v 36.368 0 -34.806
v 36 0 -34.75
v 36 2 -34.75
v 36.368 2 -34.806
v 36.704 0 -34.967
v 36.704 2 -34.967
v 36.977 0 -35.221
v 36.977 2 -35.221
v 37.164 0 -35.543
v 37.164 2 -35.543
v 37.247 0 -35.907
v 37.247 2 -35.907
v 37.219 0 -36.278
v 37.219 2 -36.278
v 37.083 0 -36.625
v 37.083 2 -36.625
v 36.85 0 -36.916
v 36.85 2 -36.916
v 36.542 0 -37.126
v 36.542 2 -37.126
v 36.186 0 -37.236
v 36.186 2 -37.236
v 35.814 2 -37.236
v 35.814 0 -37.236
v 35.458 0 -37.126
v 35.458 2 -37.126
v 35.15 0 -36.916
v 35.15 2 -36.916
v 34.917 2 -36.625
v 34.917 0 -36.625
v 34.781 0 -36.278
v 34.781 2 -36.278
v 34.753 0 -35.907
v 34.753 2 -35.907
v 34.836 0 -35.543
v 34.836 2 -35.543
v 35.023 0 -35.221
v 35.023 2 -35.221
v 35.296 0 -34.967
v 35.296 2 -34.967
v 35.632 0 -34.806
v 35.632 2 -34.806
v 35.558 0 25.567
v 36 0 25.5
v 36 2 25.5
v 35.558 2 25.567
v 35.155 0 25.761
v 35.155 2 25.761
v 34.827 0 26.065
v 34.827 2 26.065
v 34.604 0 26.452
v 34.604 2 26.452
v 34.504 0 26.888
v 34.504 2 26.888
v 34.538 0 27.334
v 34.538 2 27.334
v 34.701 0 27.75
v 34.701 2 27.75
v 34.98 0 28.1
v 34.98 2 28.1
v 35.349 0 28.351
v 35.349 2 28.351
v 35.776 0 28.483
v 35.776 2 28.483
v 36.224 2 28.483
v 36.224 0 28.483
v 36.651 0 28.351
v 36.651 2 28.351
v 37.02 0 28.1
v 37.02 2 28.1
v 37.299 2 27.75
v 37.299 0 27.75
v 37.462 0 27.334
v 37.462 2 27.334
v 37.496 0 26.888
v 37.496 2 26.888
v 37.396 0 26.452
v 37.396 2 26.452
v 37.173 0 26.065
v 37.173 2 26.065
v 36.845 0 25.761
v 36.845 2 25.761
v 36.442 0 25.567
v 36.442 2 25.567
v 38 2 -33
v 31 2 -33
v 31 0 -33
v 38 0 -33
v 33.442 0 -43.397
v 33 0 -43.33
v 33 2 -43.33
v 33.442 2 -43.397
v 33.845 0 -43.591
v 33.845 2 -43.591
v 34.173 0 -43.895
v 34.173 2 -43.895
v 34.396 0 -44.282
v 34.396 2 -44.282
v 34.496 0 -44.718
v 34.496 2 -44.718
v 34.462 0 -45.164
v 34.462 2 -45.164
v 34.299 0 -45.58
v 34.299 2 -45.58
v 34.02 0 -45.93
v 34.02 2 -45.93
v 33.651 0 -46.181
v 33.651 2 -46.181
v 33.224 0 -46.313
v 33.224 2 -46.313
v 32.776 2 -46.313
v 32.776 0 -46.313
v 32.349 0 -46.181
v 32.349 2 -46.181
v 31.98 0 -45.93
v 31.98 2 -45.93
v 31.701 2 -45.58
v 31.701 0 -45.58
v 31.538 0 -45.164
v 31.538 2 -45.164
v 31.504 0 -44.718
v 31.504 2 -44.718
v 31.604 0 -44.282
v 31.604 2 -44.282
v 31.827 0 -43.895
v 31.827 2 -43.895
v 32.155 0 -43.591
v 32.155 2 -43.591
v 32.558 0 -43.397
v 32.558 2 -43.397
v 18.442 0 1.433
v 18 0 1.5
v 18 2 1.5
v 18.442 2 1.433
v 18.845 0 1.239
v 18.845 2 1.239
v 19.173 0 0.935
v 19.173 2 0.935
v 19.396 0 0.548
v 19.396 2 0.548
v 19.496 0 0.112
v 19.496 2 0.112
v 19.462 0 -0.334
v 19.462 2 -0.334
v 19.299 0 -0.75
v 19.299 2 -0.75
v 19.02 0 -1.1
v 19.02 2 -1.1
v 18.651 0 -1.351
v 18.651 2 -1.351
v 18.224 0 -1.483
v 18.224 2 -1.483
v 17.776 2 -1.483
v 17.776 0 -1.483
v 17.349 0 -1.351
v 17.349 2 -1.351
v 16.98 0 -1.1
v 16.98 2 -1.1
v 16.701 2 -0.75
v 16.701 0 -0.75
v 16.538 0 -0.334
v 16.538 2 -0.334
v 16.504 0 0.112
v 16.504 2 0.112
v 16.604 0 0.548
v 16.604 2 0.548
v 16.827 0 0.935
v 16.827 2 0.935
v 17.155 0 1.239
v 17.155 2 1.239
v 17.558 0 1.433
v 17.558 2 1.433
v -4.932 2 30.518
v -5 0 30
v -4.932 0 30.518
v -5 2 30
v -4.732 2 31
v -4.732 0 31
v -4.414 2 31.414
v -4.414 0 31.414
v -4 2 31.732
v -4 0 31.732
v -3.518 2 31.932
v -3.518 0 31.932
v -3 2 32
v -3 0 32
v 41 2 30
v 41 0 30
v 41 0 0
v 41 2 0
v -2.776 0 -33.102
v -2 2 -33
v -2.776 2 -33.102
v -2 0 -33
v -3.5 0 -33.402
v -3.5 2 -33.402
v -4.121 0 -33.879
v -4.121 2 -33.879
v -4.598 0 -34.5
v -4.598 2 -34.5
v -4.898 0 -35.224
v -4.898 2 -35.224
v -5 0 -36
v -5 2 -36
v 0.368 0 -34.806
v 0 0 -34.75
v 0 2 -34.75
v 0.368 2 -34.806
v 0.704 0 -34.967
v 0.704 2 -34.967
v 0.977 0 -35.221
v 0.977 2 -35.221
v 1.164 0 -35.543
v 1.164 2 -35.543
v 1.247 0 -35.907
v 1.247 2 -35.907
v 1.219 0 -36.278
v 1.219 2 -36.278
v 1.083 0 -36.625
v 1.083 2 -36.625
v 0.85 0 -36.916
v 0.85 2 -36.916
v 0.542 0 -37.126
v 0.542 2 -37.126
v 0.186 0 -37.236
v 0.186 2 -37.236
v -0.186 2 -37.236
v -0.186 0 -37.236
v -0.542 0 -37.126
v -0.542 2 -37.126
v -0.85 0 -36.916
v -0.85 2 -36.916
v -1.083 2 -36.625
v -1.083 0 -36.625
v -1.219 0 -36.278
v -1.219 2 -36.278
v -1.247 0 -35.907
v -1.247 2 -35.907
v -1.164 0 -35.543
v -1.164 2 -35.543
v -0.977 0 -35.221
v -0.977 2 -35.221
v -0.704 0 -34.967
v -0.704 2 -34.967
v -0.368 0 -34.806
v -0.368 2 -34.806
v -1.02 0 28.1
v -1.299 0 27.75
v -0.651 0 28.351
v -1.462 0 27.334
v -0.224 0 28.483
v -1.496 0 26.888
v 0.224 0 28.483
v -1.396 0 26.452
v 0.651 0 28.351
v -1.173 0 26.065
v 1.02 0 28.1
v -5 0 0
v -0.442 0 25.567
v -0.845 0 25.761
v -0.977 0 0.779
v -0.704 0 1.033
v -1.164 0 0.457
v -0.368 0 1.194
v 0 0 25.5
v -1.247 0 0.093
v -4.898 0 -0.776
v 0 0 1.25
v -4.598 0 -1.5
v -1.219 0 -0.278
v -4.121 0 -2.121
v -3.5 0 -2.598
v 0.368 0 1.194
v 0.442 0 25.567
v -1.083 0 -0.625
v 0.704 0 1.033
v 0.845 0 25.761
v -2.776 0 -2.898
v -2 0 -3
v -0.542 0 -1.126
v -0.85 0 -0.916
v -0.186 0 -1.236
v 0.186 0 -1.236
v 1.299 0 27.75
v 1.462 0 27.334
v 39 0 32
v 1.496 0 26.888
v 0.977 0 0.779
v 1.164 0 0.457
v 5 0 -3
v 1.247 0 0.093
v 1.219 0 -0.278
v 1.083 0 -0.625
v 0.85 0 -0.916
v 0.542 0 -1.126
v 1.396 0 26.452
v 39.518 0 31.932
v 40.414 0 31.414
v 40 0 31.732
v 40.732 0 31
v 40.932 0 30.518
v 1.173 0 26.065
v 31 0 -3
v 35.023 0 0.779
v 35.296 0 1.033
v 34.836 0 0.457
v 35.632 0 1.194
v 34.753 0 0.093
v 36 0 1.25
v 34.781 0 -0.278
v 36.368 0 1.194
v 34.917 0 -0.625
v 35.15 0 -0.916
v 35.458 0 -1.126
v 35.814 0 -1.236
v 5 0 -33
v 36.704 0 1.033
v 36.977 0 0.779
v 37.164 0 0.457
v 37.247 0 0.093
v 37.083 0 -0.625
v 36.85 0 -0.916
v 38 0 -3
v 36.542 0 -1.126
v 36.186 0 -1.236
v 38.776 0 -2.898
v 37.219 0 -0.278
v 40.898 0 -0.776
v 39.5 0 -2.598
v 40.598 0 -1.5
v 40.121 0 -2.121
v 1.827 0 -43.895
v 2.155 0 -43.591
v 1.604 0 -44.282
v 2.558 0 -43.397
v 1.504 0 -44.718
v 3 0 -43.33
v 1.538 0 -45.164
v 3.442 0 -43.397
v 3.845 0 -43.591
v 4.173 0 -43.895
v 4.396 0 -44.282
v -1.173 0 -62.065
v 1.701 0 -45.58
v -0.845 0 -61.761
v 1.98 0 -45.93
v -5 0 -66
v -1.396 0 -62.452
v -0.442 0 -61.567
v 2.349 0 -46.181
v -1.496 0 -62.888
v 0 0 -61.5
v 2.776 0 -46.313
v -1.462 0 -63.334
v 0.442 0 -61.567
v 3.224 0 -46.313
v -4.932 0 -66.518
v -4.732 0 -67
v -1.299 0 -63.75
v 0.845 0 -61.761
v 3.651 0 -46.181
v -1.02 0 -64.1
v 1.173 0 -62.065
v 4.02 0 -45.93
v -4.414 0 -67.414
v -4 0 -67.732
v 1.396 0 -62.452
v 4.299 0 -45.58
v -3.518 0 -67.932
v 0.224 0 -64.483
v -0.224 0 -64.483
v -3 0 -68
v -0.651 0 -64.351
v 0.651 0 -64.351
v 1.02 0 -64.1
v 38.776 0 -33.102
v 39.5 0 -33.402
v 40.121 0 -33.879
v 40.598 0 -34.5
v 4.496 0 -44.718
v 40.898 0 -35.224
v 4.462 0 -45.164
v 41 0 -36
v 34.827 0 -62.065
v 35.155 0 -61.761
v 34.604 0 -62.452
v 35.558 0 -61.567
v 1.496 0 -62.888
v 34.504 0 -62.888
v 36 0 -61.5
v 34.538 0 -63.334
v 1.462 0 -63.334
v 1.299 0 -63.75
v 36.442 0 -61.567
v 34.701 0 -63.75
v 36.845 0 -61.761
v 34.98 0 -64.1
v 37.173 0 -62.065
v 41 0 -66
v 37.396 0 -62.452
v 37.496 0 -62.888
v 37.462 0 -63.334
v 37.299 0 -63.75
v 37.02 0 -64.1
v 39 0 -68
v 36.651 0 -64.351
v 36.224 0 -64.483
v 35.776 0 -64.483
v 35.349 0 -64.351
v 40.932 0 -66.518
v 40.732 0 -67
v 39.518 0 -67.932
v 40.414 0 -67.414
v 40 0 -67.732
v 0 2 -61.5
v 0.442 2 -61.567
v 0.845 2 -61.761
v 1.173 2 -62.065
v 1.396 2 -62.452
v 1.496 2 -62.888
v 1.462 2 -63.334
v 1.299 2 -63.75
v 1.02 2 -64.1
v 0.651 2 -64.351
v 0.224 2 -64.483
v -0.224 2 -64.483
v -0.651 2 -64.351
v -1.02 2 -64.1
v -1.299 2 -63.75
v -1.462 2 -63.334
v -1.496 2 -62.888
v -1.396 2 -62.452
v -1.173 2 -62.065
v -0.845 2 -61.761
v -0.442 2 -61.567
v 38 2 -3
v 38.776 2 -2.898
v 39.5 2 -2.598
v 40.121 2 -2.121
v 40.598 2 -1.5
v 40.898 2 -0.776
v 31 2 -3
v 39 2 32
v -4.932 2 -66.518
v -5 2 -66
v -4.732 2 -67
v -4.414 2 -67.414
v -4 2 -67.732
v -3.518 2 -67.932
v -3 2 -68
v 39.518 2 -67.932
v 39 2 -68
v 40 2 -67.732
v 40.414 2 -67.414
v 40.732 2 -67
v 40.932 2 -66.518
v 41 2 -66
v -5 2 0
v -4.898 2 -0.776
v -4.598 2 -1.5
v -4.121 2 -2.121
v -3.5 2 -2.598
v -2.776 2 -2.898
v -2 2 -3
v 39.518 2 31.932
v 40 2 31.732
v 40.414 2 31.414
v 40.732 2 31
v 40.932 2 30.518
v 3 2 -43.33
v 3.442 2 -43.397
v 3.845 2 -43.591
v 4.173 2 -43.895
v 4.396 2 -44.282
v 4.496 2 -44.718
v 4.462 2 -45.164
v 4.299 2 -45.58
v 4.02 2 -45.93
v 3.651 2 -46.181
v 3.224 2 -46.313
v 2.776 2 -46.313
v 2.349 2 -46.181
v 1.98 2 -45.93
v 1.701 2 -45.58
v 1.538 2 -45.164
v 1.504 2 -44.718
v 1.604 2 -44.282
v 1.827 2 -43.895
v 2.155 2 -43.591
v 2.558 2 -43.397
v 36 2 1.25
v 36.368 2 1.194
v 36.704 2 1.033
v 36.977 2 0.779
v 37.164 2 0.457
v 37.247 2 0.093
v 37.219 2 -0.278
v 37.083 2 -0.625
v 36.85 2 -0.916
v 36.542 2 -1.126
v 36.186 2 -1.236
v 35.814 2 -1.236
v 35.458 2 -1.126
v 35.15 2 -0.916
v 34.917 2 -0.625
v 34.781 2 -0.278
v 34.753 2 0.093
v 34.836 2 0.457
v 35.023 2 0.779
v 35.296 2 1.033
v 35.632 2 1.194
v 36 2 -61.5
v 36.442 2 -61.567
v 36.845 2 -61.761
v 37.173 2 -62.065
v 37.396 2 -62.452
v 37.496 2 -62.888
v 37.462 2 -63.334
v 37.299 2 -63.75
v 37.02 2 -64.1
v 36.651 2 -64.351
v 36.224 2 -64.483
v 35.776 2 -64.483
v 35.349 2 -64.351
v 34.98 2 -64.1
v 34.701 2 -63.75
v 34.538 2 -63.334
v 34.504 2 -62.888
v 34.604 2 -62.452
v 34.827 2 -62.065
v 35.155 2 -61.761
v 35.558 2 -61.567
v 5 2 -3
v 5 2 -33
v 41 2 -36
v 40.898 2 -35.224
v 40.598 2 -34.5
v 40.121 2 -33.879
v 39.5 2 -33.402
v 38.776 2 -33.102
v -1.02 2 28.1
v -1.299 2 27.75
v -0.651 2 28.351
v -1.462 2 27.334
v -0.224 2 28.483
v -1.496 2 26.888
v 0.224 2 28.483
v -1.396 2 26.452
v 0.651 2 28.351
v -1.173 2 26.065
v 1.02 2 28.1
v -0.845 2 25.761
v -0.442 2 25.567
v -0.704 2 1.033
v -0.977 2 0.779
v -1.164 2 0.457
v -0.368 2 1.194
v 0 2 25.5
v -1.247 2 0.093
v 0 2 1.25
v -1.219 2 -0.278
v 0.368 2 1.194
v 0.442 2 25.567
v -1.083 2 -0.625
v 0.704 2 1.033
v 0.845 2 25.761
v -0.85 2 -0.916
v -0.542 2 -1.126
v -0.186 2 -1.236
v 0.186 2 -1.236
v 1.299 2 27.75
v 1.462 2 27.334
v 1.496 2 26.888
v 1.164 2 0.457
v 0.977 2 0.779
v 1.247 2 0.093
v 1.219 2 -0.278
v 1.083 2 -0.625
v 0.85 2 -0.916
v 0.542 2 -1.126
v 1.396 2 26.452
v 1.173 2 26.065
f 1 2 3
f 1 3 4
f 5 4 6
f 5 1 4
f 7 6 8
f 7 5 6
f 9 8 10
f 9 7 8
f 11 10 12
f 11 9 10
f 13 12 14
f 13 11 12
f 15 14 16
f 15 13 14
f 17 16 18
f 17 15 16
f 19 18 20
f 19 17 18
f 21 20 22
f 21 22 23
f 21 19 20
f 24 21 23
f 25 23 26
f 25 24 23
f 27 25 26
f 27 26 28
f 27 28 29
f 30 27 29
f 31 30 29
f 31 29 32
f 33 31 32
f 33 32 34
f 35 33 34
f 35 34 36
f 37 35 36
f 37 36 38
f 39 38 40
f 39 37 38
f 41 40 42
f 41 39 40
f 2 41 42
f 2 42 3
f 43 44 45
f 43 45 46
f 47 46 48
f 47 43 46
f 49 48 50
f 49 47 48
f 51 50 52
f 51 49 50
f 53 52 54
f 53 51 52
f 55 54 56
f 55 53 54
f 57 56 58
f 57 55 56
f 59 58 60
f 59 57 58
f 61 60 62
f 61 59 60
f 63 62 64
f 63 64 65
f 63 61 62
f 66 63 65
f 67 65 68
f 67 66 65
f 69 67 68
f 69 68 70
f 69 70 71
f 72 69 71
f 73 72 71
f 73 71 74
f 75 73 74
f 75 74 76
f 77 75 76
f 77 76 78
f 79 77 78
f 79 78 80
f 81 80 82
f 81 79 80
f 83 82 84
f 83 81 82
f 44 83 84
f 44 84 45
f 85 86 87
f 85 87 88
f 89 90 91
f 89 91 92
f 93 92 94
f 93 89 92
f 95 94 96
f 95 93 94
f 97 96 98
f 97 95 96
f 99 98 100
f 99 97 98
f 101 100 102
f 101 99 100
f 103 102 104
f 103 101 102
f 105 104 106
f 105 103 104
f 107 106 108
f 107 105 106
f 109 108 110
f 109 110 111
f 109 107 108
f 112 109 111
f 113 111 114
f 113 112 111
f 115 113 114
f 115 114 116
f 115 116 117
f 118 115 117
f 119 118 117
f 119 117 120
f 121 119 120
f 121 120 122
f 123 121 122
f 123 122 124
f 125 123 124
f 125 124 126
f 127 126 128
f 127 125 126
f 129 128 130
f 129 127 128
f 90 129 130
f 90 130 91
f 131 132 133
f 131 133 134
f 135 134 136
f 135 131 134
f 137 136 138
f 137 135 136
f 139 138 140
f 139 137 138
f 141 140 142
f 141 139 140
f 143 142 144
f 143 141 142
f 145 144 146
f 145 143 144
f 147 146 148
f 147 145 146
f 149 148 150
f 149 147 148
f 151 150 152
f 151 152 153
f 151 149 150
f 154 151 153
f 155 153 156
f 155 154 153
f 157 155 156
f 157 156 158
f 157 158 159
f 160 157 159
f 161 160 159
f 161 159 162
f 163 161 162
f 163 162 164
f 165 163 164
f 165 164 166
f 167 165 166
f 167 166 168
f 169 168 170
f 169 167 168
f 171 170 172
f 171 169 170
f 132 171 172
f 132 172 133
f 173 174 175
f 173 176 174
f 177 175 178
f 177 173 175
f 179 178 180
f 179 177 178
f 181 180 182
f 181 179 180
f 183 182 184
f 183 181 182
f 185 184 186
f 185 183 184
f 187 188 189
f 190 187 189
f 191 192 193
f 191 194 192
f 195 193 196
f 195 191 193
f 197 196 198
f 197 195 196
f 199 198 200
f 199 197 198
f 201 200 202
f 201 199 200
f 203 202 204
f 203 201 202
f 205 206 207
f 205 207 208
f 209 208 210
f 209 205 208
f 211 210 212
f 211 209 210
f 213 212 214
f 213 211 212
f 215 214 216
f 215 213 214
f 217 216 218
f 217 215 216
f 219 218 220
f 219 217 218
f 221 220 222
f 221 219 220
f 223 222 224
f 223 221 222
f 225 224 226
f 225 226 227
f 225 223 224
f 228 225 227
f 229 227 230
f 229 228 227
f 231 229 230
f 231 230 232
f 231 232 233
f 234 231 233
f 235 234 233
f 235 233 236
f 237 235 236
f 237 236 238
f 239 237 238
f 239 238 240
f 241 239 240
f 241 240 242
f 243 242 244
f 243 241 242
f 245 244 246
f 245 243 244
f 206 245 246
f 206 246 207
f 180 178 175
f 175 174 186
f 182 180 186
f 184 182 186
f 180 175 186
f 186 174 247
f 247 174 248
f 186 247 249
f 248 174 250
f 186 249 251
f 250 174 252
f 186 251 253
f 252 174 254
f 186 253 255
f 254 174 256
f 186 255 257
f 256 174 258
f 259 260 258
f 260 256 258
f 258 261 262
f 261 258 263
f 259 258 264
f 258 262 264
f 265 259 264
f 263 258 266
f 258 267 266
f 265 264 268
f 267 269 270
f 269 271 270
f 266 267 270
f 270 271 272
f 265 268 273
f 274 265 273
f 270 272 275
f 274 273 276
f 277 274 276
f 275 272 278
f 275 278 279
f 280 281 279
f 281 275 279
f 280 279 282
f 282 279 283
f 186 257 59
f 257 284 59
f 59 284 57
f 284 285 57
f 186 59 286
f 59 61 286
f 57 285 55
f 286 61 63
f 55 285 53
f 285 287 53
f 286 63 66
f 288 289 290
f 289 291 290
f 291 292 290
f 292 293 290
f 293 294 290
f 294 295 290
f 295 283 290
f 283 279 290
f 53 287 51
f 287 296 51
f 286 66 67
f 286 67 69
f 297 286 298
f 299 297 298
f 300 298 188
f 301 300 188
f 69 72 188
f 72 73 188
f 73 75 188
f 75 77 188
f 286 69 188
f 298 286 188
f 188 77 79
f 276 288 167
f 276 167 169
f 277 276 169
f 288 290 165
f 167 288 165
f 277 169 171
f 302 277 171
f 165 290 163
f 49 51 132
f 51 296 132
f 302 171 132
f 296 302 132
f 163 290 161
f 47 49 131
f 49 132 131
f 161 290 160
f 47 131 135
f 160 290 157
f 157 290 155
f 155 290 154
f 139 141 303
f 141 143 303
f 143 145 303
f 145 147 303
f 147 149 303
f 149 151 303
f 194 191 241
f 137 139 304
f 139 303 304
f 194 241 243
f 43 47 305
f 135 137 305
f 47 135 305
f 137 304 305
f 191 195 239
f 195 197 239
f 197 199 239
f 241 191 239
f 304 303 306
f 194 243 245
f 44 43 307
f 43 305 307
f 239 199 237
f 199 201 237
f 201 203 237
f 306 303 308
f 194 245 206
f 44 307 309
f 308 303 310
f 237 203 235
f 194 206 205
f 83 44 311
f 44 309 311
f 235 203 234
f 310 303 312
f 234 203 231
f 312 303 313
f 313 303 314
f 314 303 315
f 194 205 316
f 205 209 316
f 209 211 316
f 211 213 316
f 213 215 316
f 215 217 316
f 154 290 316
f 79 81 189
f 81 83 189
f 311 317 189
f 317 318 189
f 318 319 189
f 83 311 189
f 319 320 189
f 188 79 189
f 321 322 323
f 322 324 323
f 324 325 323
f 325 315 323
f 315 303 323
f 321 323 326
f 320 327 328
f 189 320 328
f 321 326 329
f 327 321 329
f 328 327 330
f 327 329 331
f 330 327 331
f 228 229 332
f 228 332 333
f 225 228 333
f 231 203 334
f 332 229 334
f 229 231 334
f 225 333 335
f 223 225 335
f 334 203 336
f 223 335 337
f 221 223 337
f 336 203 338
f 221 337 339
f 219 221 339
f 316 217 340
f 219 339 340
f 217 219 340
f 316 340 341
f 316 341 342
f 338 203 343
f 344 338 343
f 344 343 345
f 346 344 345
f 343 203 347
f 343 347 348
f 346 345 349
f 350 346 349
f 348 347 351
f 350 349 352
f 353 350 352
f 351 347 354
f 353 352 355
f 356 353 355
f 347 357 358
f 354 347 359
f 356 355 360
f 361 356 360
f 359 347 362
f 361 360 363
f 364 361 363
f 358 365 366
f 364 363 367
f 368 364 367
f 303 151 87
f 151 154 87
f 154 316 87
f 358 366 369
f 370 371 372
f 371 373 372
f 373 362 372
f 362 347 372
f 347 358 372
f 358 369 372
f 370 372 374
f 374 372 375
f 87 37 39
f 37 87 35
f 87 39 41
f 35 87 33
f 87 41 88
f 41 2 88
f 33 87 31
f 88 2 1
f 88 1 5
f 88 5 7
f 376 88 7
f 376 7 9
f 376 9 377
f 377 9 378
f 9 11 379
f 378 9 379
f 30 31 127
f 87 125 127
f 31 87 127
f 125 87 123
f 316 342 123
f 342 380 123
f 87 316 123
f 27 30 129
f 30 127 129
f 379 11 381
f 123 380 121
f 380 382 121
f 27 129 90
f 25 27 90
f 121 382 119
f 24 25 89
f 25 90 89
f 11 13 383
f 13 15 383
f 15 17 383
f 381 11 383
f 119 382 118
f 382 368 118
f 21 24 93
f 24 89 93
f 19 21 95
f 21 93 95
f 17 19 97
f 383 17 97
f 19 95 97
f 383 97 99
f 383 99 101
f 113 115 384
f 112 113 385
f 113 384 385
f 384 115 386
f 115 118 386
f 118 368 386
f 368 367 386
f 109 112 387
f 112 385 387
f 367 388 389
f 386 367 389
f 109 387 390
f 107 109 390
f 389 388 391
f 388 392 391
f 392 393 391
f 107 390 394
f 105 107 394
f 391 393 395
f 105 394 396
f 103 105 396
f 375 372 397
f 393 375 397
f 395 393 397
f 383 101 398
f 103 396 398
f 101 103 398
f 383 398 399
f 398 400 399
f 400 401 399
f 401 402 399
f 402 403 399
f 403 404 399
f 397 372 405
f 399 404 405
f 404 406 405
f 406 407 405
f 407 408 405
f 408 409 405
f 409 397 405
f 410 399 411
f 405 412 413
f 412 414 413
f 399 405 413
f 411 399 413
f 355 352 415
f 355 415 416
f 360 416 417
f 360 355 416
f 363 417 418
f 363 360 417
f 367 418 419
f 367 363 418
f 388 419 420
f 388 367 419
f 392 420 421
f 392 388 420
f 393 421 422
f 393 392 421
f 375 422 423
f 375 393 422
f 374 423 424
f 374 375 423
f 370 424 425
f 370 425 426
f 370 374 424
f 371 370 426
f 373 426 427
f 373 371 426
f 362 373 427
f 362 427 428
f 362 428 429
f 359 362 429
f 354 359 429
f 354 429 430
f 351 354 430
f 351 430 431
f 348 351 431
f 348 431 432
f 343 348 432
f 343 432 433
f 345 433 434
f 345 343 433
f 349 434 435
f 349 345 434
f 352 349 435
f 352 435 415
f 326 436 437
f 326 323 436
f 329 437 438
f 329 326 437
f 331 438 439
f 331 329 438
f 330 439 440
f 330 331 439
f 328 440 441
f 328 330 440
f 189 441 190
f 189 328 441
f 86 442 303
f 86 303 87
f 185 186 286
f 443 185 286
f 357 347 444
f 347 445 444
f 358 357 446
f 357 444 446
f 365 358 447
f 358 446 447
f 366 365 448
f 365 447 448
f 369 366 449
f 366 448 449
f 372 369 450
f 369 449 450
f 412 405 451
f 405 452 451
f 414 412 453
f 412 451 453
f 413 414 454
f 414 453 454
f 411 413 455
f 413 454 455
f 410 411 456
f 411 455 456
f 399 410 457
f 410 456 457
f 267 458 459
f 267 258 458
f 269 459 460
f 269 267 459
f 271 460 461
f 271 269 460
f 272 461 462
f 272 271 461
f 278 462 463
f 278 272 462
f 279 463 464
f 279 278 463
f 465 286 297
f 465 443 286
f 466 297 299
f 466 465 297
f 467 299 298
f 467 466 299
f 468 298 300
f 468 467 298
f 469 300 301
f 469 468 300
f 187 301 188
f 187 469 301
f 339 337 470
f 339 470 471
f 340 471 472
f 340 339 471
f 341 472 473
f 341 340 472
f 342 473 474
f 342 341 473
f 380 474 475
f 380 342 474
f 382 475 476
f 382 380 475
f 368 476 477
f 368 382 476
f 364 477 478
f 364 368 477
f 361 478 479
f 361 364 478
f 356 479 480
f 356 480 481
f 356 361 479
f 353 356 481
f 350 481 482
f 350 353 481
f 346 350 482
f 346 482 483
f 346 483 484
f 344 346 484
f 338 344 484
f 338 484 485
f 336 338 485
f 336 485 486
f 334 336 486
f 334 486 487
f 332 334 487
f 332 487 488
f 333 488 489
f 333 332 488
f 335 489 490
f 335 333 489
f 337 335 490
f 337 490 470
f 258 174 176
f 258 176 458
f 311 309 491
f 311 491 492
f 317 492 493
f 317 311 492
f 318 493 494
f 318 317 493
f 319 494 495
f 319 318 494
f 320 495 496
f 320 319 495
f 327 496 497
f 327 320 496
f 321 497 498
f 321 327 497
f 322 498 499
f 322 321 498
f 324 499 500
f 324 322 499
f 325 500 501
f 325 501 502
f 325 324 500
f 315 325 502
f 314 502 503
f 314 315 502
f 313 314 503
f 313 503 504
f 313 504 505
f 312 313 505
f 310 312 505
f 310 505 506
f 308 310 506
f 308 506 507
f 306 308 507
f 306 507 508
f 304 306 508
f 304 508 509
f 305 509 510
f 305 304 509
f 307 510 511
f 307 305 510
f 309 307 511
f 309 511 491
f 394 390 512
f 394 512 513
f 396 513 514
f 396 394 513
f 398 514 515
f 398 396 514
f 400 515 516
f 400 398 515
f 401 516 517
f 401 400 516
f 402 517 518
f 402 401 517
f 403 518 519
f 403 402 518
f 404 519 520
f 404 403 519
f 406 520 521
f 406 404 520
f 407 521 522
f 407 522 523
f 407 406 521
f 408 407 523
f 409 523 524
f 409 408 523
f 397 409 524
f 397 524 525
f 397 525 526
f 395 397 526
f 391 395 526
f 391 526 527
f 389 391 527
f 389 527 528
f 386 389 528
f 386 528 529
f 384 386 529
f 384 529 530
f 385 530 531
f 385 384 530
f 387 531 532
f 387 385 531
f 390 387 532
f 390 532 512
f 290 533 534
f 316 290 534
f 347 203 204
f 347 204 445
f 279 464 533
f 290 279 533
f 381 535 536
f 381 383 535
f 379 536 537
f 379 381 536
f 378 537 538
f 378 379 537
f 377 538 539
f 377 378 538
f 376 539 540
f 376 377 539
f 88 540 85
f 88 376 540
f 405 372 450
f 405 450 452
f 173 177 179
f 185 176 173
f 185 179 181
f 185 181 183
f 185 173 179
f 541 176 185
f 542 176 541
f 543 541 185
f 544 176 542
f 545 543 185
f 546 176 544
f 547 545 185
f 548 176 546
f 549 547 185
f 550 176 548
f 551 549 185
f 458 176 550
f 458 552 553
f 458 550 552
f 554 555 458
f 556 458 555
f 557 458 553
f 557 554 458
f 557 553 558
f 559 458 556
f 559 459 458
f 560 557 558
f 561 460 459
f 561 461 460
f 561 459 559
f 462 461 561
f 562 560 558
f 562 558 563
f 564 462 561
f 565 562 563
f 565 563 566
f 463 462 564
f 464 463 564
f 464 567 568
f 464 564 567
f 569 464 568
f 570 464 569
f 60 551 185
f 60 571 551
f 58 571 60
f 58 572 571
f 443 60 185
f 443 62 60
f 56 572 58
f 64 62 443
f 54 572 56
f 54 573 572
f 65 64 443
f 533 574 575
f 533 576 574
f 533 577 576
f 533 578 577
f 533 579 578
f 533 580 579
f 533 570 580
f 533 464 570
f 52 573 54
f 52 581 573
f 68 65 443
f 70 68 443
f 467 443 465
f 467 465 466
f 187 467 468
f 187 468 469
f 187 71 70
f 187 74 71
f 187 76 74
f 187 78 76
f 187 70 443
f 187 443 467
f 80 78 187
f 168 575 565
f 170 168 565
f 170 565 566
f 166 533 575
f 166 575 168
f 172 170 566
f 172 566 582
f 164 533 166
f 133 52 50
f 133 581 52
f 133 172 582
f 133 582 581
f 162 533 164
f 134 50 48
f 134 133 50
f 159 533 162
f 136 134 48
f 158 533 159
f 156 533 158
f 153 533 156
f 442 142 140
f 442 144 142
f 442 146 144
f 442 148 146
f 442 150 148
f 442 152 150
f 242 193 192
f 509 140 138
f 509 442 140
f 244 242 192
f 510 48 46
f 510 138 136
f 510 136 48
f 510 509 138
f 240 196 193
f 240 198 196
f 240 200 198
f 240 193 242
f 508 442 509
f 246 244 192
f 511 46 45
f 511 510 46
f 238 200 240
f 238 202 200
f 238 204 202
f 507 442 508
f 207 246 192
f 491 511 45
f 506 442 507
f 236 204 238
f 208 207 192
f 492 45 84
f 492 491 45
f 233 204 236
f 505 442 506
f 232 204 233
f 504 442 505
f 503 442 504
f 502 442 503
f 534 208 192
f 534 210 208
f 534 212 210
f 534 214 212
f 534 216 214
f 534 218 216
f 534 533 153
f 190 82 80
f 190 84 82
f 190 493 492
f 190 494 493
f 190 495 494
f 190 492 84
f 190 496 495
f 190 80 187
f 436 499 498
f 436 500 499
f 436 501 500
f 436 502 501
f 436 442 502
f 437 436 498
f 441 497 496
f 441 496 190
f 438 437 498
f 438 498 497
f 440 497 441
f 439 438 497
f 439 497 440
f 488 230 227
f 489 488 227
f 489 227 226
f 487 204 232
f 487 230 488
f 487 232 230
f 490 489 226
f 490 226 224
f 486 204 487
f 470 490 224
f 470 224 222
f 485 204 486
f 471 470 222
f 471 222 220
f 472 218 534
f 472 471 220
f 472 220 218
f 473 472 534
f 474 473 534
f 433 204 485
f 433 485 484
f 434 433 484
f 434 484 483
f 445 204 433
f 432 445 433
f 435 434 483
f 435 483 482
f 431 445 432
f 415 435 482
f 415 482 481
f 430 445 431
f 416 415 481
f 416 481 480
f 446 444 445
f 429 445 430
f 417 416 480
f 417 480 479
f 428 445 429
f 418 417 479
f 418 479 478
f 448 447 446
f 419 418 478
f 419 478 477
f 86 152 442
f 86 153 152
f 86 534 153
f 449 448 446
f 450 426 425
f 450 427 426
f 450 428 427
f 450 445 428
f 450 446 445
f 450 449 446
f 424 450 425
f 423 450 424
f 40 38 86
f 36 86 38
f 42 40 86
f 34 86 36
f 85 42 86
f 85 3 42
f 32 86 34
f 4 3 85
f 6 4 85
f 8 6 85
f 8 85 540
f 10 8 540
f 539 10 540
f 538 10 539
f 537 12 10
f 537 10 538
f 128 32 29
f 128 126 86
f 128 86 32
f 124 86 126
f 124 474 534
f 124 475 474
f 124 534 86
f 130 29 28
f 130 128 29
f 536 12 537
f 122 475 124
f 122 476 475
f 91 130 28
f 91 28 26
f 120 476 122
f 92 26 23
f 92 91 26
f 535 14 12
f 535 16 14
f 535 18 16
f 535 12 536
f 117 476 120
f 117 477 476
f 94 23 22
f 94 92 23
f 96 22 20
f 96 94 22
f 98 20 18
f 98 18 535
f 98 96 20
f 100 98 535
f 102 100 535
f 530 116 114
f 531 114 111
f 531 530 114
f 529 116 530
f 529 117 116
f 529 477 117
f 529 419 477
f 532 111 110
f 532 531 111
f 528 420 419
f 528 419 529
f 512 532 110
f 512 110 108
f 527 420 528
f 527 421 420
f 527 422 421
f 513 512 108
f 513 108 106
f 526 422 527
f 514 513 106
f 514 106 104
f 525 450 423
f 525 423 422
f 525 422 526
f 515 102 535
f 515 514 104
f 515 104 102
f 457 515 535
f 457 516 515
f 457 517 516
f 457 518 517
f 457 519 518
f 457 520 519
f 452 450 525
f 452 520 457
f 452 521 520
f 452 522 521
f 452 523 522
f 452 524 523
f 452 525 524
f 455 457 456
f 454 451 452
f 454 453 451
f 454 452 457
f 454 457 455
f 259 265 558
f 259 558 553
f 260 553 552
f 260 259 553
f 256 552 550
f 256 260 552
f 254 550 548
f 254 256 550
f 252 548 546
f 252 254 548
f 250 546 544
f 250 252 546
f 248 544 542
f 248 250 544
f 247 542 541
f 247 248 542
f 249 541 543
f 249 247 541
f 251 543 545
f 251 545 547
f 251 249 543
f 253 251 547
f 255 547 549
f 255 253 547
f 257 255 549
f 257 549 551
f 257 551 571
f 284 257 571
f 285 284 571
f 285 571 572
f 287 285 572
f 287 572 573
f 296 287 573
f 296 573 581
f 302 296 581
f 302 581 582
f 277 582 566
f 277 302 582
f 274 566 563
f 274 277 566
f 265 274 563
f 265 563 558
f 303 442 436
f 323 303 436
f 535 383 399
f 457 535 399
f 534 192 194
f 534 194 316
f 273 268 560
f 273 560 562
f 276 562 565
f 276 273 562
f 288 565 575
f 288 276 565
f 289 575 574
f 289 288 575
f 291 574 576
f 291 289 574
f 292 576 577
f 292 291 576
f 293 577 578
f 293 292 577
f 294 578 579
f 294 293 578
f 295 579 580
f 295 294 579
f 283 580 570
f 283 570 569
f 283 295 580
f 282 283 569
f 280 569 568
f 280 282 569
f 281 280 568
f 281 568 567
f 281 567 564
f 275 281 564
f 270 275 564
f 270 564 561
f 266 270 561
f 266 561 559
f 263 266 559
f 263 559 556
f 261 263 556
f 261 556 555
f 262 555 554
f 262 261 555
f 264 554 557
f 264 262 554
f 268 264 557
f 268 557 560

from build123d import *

# Parameters (mm, degrees)
SKETCH_1_W          = 46
SKETCH_1_H          = 100
SKETCH_1_R          = 1.25
SKETCH_1_R_2        = 1.5
EXTRUDE_1_DEPTH     = 2
FILLET_1_R          = 2
SKETCH_2_W          = 10
SKETCH_2_H          = 30
CUT_EXTRUDE_1_DEPTH = 80.429213769
FILLET_2_R          = 3


with BuildPart() as part:
    # 草图1 → 凸台-拉伸1 (new body)
    with BuildSketch(Plane(origin=(0, 0, 0), x_dir=(1, 0, 0), z_dir=(0, 1, 0))):
        with Locations((18, 18)):
            Rectangle(SKETCH_1_W, SKETCH_1_H)
        with Locations(Location((0, 36, 0), (0, 0, 270))):
            Circle(SKETCH_1_R, mode=Mode.SUBTRACT)
        with Locations(Location((36, 36, 0), (0, 0, 270))):
            Circle(SKETCH_1_R, mode=Mode.SUBTRACT)
        with Locations(Location((0, 0, 0), (0, 0, 270))):
            Circle(SKETCH_1_R, mode=Mode.SUBTRACT)
        with Locations(Location((36, 0, 0), (0, 0, 270))):
            Circle(SKETCH_1_R, mode=Mode.SUBTRACT)
        with Locations(Location((0, 63, 0), (0, 0, 270))):
            Circle(SKETCH_1_R_2, mode=Mode.SUBTRACT)
        with Locations(Location((36, 63, 0), (0, 0, 270))):
            Circle(SKETCH_1_R_2, mode=Mode.SUBTRACT)
        with Locations(Location((36, -27, 0), (0, 0, 90))):
            Circle(SKETCH_1_R_2, mode=Mode.SUBTRACT)
        with Locations(Location((0, -27, 0), (0, 0, 90))):
            Circle(SKETCH_1_R_2, mode=Mode.SUBTRACT)
        with Locations(Location((3, 44.83, 0), (0, 0, 270))):
            Circle(SKETCH_1_R_2, mode=Mode.SUBTRACT)
        with Locations(Location((33, 44.83, 0), (0, 0, 270))):
            Circle(SKETCH_1_R_2, mode=Mode.SUBTRACT)
        with Locations(Location((18, 0, 0), (0, 0, 270))):
            Circle(SKETCH_1_R_2, mode=Mode.SUBTRACT)
    extrude(amount=EXTRUDE_1_DEPTH)

    # 圆角1
    fillet_1_edges = [part.edges().sort_by_distance(p)[0] for p in [
        (-5, 1, -68),
        (41, 1, -68),
        (41, 1, 32),
        (-5, 1, 32),
    ]]
    fillet(fillet_1_edges, radius=FILLET_1_R)

    # 草图2 → 切除-拉伸1 (cut, through all)
    with BuildSketch(Plane(origin=(0, 2, 0), x_dir=(1, 0, 0), z_dir=(0, 1, 0))):
        with Locations((0, 18)):
            Rectangle(SKETCH_2_W, SKETCH_2_H)
        with Locations((36, 18)):
            Rectangle(SKETCH_2_W, SKETCH_2_H)
    extrude(amount=-CUT_EXTRUDE_1_DEPTH, mode=Mode.SUBTRACT)

    # 圆角2
    fillet_2_edges = [part.edges().sort_by_distance(p)[0] for p in [
        (-5, 1, -3),
        (-5, 1, -33),
        (41, 1, -33),
        (41, 1, -3),
    ]]
    fillet(fillet_2_edges, radius=FILLET_2_R)


solid = part.part
